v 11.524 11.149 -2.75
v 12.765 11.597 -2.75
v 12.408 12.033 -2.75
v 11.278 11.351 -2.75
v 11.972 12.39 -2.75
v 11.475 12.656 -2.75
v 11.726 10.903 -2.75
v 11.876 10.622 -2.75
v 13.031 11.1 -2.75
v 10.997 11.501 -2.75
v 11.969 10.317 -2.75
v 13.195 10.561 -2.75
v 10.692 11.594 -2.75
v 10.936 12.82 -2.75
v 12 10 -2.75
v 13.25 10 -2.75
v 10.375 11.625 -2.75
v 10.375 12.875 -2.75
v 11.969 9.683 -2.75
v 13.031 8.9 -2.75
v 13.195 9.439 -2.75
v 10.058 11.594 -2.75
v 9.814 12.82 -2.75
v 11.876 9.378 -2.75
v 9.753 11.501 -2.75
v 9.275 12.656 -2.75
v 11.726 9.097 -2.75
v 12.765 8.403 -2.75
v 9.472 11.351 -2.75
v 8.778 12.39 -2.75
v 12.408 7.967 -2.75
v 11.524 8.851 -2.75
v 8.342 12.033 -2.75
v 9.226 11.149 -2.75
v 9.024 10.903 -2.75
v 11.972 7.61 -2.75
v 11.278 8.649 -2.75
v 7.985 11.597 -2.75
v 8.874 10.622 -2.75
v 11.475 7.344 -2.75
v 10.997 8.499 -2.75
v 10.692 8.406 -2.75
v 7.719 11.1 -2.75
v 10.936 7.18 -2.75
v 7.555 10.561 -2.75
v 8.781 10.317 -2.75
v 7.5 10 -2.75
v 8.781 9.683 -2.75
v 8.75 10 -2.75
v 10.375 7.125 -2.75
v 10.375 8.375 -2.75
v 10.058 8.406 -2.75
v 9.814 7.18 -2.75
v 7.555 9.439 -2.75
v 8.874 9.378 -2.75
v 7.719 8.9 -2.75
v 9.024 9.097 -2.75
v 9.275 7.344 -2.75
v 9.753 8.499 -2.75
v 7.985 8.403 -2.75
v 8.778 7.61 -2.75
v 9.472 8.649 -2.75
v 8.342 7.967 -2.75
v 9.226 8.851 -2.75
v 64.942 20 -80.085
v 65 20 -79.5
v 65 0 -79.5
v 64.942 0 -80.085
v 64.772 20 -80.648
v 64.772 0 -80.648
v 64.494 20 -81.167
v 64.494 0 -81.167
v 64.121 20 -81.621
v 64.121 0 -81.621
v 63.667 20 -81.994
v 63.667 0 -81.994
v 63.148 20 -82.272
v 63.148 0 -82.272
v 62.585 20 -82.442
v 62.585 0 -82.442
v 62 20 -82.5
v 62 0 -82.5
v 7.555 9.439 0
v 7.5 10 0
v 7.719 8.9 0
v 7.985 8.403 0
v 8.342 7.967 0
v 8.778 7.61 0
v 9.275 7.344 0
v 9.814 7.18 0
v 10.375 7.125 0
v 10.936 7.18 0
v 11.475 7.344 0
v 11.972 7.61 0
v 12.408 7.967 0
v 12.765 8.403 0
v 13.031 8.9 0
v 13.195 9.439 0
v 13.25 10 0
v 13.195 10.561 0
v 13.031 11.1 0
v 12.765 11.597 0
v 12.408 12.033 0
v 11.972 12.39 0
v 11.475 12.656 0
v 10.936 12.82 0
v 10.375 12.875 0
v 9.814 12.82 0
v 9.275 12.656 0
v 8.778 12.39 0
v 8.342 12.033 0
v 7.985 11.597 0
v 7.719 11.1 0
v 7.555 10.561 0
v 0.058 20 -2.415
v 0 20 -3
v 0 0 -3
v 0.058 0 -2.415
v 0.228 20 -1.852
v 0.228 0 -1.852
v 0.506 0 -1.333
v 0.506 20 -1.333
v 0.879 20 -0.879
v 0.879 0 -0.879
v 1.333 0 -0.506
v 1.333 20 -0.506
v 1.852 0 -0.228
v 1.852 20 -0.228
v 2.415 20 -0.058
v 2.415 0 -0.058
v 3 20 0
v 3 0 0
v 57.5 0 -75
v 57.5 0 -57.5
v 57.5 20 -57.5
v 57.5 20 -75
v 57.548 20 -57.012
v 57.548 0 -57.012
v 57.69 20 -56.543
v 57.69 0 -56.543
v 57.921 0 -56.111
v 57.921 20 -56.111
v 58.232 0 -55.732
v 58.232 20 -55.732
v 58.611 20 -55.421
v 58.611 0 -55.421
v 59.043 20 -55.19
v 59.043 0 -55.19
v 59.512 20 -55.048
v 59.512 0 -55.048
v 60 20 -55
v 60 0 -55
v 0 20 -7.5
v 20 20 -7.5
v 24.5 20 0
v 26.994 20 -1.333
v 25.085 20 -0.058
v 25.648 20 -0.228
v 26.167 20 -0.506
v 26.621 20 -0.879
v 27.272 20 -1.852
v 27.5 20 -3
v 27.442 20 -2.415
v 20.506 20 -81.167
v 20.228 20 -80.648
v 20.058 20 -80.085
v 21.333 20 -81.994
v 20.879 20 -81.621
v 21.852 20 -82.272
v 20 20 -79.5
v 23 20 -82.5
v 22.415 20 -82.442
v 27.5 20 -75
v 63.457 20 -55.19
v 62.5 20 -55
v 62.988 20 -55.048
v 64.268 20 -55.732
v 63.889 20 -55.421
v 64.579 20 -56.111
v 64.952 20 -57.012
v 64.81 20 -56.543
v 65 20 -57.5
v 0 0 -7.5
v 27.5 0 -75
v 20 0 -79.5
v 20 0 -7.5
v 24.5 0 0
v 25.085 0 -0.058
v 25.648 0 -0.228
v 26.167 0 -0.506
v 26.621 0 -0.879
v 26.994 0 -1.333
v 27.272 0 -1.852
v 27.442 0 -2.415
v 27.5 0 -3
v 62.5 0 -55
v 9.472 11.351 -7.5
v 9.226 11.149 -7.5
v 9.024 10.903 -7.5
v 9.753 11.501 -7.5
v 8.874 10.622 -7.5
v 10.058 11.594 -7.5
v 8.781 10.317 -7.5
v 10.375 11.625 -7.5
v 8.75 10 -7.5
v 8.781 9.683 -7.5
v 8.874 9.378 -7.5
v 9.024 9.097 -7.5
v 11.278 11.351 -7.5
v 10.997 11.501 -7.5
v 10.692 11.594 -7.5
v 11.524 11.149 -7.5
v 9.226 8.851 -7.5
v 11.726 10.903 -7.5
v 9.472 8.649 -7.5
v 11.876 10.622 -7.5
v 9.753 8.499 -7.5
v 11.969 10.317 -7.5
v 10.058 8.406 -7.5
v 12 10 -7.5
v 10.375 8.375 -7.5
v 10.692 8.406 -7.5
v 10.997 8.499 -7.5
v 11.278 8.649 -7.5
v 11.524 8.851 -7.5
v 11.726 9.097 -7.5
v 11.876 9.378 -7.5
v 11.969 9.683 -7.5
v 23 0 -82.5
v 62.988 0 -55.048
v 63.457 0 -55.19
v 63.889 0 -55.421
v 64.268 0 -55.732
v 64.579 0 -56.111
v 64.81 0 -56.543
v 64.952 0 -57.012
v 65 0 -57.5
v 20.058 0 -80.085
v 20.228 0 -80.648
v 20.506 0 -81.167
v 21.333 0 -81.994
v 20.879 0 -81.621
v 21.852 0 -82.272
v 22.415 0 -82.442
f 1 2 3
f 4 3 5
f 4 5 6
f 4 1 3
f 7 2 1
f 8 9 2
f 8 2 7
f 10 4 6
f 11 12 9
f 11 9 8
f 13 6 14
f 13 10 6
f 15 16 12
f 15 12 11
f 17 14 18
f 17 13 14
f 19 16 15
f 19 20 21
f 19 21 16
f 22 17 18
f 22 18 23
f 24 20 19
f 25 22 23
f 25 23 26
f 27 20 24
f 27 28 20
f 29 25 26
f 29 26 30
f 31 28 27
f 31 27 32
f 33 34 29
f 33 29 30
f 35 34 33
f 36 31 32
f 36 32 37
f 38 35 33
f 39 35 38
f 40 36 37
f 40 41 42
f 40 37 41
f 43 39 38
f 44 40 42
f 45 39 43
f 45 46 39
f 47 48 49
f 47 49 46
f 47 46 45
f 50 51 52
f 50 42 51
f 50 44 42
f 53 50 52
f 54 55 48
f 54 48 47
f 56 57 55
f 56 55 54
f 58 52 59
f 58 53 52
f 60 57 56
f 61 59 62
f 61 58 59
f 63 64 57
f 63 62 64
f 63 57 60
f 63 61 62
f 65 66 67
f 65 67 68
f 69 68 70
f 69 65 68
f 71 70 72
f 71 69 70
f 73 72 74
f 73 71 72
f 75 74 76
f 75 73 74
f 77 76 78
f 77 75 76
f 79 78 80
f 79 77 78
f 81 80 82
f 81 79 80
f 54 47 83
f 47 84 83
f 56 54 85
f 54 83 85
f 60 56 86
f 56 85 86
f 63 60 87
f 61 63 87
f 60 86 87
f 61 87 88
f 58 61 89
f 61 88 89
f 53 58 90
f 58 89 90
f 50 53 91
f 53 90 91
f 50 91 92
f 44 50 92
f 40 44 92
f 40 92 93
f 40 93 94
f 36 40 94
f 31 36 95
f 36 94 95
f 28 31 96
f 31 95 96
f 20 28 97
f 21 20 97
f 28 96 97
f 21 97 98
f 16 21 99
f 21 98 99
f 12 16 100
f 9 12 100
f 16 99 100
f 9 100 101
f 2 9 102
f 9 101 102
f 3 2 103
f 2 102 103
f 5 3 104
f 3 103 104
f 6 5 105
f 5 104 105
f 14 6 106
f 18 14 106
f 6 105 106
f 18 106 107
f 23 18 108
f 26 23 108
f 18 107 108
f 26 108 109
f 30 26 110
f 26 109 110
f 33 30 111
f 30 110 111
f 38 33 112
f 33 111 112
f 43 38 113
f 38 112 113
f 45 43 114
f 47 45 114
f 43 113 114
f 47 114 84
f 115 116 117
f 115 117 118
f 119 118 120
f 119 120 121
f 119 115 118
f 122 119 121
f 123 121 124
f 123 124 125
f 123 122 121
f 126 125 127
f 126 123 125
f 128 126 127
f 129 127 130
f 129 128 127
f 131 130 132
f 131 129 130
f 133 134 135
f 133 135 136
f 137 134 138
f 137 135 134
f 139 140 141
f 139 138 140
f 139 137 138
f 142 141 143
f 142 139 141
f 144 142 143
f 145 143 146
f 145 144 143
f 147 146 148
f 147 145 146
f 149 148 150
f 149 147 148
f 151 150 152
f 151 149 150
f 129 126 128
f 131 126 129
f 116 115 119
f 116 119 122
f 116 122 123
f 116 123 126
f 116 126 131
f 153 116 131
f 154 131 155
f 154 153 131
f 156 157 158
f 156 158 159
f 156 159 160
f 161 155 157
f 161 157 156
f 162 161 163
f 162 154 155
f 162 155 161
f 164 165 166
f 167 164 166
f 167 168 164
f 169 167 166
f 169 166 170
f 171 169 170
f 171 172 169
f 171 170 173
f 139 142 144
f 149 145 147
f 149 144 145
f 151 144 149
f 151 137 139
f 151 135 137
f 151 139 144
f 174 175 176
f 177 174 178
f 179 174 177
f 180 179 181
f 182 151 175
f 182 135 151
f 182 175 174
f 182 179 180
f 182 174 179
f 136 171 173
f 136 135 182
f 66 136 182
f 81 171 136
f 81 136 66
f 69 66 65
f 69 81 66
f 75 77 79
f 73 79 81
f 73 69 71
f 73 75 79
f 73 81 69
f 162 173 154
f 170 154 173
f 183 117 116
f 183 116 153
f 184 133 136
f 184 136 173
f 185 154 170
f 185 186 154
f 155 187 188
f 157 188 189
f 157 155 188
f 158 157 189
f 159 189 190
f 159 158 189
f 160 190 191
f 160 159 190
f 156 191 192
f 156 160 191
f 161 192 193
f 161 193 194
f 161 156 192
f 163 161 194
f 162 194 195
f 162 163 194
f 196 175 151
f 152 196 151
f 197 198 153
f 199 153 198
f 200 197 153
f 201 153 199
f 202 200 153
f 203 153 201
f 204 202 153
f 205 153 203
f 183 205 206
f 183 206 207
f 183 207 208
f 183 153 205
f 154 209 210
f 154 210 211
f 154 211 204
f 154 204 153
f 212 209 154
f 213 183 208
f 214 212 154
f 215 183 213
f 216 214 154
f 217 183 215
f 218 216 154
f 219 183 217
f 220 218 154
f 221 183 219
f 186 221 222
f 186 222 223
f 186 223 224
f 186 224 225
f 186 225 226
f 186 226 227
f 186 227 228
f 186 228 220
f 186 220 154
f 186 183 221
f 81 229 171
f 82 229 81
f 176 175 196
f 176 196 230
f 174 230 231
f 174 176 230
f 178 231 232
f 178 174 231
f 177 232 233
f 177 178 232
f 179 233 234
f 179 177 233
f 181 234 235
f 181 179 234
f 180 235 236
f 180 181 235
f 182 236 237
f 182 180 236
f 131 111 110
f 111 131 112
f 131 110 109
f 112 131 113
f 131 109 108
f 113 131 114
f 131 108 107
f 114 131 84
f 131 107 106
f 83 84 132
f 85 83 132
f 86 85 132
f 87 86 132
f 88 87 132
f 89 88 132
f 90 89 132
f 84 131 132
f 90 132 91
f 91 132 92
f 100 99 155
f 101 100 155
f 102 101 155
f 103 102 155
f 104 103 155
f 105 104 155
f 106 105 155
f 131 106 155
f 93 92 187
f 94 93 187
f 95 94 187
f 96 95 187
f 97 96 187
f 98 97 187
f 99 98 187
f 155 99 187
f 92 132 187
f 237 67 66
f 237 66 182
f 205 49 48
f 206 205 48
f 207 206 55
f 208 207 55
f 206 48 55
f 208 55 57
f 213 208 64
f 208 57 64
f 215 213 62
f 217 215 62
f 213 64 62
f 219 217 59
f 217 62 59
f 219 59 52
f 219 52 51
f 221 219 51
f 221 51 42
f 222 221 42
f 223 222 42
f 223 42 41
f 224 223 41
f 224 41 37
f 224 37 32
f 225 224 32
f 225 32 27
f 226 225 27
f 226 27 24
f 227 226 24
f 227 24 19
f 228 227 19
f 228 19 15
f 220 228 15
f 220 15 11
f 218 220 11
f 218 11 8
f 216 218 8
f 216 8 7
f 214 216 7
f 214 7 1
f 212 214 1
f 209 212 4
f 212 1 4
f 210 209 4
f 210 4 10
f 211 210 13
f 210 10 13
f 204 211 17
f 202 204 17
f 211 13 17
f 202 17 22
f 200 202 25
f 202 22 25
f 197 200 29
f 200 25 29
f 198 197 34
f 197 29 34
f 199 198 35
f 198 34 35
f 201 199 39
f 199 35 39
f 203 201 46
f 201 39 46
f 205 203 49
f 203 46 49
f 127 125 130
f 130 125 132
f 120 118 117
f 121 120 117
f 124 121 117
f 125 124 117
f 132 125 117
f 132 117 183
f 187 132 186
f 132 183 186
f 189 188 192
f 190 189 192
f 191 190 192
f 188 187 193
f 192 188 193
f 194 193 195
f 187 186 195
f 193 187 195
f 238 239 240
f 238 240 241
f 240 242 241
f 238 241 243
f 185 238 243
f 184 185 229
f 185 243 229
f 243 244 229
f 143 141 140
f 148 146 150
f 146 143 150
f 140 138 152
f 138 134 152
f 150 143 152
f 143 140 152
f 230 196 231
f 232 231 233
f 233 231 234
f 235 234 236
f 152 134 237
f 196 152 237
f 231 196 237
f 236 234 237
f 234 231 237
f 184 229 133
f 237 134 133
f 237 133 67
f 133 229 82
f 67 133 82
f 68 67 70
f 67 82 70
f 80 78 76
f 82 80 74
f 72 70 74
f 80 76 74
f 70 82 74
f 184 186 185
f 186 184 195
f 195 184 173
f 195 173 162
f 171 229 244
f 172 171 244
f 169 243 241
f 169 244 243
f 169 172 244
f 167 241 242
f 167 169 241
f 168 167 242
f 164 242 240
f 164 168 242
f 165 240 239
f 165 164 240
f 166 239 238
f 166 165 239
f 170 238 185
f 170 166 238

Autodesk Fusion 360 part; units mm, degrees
sketch "side" plane through (0, 0, 0) normal (0, 1, 0) x (1, 0, 0)
  line L0 (0, 0) -> (27.5, 0)
  line L1 (0, 0) -> (0, 7.5)
  line L2 (0, 7.5) -> (20, 7.5)
  line L3 (20, 7.5) -> (20, 82.5)
  line L4 (34.8526, 82.5) -> (20, 82.5)
  line L5 (34.8526, 82.5) -> (65, 82.5)
  line L6 (65, 82.5) -> (65, 55)
  line L7 (65, 55) -> (57.5, 55)
  line L8 (57.5, 55) -> (57.5, 75)
  line L9 (57.5, 75) -> (27.5, 75)
  line L10 (27.5, 75) -> (27.5, 0)
  dimension "d1" = 7.5
  dimension "d2" = 7.5
  dimension "d3" = 7.5
  dimension "d4" = 20
  dimension "d5" = 7.5
  dimension "d6" = 30
  dimension "d7" = 20
  dimension "d8" = 75
extrude "Extrude1" add sketch "side" along normal blind 20
sketch "top" plane through (0, 0, 0) normal (0, 0, 1) x (-1, 0, 0)
  line L0 (0, 0) -> (-27.5, 0)
  line L1 (-27.5, 0) -> (-27.5, -20)
  line L2 (-27.5, -20) -> (0, -20)
  line L3 (0, -20) -> (0, 0)
  line L4 (-13.75, -20) -> (-13.75, 0) construction
  circle A0 centre (-10.375, -10) radius 1.625
  circle A1 centre (-10.375, -10) radius 2.875
  line L5 (-10.375, -10) -> (0, -10) construction
  dimension "d11" = 3.25
  dimension "d12" = 5.75
  dimension "d27" = 7.5
fillet "Fillet1" radius 3 1 edges at (65, 10, -82.5)
fillet "Fillet2" radius 3 1 edges at (27.5, 10, 0)
fillet "Fillet3" radius 3 1 edges at (20, 10, -82.5)
fillet "Fillet4" radius 2.5 2 edges at (65, 10, -55) (57.5, 10, -55)
fillet "Fillet5" radius 3 1 edges at (0, 10, 0)
extrude "Extrude2" cut sketch "top" against normal up to surface (7.5 mm away) contours A0
extrude "Extrude3" cut sketch "top" against normal blind 2.75 contours A1
